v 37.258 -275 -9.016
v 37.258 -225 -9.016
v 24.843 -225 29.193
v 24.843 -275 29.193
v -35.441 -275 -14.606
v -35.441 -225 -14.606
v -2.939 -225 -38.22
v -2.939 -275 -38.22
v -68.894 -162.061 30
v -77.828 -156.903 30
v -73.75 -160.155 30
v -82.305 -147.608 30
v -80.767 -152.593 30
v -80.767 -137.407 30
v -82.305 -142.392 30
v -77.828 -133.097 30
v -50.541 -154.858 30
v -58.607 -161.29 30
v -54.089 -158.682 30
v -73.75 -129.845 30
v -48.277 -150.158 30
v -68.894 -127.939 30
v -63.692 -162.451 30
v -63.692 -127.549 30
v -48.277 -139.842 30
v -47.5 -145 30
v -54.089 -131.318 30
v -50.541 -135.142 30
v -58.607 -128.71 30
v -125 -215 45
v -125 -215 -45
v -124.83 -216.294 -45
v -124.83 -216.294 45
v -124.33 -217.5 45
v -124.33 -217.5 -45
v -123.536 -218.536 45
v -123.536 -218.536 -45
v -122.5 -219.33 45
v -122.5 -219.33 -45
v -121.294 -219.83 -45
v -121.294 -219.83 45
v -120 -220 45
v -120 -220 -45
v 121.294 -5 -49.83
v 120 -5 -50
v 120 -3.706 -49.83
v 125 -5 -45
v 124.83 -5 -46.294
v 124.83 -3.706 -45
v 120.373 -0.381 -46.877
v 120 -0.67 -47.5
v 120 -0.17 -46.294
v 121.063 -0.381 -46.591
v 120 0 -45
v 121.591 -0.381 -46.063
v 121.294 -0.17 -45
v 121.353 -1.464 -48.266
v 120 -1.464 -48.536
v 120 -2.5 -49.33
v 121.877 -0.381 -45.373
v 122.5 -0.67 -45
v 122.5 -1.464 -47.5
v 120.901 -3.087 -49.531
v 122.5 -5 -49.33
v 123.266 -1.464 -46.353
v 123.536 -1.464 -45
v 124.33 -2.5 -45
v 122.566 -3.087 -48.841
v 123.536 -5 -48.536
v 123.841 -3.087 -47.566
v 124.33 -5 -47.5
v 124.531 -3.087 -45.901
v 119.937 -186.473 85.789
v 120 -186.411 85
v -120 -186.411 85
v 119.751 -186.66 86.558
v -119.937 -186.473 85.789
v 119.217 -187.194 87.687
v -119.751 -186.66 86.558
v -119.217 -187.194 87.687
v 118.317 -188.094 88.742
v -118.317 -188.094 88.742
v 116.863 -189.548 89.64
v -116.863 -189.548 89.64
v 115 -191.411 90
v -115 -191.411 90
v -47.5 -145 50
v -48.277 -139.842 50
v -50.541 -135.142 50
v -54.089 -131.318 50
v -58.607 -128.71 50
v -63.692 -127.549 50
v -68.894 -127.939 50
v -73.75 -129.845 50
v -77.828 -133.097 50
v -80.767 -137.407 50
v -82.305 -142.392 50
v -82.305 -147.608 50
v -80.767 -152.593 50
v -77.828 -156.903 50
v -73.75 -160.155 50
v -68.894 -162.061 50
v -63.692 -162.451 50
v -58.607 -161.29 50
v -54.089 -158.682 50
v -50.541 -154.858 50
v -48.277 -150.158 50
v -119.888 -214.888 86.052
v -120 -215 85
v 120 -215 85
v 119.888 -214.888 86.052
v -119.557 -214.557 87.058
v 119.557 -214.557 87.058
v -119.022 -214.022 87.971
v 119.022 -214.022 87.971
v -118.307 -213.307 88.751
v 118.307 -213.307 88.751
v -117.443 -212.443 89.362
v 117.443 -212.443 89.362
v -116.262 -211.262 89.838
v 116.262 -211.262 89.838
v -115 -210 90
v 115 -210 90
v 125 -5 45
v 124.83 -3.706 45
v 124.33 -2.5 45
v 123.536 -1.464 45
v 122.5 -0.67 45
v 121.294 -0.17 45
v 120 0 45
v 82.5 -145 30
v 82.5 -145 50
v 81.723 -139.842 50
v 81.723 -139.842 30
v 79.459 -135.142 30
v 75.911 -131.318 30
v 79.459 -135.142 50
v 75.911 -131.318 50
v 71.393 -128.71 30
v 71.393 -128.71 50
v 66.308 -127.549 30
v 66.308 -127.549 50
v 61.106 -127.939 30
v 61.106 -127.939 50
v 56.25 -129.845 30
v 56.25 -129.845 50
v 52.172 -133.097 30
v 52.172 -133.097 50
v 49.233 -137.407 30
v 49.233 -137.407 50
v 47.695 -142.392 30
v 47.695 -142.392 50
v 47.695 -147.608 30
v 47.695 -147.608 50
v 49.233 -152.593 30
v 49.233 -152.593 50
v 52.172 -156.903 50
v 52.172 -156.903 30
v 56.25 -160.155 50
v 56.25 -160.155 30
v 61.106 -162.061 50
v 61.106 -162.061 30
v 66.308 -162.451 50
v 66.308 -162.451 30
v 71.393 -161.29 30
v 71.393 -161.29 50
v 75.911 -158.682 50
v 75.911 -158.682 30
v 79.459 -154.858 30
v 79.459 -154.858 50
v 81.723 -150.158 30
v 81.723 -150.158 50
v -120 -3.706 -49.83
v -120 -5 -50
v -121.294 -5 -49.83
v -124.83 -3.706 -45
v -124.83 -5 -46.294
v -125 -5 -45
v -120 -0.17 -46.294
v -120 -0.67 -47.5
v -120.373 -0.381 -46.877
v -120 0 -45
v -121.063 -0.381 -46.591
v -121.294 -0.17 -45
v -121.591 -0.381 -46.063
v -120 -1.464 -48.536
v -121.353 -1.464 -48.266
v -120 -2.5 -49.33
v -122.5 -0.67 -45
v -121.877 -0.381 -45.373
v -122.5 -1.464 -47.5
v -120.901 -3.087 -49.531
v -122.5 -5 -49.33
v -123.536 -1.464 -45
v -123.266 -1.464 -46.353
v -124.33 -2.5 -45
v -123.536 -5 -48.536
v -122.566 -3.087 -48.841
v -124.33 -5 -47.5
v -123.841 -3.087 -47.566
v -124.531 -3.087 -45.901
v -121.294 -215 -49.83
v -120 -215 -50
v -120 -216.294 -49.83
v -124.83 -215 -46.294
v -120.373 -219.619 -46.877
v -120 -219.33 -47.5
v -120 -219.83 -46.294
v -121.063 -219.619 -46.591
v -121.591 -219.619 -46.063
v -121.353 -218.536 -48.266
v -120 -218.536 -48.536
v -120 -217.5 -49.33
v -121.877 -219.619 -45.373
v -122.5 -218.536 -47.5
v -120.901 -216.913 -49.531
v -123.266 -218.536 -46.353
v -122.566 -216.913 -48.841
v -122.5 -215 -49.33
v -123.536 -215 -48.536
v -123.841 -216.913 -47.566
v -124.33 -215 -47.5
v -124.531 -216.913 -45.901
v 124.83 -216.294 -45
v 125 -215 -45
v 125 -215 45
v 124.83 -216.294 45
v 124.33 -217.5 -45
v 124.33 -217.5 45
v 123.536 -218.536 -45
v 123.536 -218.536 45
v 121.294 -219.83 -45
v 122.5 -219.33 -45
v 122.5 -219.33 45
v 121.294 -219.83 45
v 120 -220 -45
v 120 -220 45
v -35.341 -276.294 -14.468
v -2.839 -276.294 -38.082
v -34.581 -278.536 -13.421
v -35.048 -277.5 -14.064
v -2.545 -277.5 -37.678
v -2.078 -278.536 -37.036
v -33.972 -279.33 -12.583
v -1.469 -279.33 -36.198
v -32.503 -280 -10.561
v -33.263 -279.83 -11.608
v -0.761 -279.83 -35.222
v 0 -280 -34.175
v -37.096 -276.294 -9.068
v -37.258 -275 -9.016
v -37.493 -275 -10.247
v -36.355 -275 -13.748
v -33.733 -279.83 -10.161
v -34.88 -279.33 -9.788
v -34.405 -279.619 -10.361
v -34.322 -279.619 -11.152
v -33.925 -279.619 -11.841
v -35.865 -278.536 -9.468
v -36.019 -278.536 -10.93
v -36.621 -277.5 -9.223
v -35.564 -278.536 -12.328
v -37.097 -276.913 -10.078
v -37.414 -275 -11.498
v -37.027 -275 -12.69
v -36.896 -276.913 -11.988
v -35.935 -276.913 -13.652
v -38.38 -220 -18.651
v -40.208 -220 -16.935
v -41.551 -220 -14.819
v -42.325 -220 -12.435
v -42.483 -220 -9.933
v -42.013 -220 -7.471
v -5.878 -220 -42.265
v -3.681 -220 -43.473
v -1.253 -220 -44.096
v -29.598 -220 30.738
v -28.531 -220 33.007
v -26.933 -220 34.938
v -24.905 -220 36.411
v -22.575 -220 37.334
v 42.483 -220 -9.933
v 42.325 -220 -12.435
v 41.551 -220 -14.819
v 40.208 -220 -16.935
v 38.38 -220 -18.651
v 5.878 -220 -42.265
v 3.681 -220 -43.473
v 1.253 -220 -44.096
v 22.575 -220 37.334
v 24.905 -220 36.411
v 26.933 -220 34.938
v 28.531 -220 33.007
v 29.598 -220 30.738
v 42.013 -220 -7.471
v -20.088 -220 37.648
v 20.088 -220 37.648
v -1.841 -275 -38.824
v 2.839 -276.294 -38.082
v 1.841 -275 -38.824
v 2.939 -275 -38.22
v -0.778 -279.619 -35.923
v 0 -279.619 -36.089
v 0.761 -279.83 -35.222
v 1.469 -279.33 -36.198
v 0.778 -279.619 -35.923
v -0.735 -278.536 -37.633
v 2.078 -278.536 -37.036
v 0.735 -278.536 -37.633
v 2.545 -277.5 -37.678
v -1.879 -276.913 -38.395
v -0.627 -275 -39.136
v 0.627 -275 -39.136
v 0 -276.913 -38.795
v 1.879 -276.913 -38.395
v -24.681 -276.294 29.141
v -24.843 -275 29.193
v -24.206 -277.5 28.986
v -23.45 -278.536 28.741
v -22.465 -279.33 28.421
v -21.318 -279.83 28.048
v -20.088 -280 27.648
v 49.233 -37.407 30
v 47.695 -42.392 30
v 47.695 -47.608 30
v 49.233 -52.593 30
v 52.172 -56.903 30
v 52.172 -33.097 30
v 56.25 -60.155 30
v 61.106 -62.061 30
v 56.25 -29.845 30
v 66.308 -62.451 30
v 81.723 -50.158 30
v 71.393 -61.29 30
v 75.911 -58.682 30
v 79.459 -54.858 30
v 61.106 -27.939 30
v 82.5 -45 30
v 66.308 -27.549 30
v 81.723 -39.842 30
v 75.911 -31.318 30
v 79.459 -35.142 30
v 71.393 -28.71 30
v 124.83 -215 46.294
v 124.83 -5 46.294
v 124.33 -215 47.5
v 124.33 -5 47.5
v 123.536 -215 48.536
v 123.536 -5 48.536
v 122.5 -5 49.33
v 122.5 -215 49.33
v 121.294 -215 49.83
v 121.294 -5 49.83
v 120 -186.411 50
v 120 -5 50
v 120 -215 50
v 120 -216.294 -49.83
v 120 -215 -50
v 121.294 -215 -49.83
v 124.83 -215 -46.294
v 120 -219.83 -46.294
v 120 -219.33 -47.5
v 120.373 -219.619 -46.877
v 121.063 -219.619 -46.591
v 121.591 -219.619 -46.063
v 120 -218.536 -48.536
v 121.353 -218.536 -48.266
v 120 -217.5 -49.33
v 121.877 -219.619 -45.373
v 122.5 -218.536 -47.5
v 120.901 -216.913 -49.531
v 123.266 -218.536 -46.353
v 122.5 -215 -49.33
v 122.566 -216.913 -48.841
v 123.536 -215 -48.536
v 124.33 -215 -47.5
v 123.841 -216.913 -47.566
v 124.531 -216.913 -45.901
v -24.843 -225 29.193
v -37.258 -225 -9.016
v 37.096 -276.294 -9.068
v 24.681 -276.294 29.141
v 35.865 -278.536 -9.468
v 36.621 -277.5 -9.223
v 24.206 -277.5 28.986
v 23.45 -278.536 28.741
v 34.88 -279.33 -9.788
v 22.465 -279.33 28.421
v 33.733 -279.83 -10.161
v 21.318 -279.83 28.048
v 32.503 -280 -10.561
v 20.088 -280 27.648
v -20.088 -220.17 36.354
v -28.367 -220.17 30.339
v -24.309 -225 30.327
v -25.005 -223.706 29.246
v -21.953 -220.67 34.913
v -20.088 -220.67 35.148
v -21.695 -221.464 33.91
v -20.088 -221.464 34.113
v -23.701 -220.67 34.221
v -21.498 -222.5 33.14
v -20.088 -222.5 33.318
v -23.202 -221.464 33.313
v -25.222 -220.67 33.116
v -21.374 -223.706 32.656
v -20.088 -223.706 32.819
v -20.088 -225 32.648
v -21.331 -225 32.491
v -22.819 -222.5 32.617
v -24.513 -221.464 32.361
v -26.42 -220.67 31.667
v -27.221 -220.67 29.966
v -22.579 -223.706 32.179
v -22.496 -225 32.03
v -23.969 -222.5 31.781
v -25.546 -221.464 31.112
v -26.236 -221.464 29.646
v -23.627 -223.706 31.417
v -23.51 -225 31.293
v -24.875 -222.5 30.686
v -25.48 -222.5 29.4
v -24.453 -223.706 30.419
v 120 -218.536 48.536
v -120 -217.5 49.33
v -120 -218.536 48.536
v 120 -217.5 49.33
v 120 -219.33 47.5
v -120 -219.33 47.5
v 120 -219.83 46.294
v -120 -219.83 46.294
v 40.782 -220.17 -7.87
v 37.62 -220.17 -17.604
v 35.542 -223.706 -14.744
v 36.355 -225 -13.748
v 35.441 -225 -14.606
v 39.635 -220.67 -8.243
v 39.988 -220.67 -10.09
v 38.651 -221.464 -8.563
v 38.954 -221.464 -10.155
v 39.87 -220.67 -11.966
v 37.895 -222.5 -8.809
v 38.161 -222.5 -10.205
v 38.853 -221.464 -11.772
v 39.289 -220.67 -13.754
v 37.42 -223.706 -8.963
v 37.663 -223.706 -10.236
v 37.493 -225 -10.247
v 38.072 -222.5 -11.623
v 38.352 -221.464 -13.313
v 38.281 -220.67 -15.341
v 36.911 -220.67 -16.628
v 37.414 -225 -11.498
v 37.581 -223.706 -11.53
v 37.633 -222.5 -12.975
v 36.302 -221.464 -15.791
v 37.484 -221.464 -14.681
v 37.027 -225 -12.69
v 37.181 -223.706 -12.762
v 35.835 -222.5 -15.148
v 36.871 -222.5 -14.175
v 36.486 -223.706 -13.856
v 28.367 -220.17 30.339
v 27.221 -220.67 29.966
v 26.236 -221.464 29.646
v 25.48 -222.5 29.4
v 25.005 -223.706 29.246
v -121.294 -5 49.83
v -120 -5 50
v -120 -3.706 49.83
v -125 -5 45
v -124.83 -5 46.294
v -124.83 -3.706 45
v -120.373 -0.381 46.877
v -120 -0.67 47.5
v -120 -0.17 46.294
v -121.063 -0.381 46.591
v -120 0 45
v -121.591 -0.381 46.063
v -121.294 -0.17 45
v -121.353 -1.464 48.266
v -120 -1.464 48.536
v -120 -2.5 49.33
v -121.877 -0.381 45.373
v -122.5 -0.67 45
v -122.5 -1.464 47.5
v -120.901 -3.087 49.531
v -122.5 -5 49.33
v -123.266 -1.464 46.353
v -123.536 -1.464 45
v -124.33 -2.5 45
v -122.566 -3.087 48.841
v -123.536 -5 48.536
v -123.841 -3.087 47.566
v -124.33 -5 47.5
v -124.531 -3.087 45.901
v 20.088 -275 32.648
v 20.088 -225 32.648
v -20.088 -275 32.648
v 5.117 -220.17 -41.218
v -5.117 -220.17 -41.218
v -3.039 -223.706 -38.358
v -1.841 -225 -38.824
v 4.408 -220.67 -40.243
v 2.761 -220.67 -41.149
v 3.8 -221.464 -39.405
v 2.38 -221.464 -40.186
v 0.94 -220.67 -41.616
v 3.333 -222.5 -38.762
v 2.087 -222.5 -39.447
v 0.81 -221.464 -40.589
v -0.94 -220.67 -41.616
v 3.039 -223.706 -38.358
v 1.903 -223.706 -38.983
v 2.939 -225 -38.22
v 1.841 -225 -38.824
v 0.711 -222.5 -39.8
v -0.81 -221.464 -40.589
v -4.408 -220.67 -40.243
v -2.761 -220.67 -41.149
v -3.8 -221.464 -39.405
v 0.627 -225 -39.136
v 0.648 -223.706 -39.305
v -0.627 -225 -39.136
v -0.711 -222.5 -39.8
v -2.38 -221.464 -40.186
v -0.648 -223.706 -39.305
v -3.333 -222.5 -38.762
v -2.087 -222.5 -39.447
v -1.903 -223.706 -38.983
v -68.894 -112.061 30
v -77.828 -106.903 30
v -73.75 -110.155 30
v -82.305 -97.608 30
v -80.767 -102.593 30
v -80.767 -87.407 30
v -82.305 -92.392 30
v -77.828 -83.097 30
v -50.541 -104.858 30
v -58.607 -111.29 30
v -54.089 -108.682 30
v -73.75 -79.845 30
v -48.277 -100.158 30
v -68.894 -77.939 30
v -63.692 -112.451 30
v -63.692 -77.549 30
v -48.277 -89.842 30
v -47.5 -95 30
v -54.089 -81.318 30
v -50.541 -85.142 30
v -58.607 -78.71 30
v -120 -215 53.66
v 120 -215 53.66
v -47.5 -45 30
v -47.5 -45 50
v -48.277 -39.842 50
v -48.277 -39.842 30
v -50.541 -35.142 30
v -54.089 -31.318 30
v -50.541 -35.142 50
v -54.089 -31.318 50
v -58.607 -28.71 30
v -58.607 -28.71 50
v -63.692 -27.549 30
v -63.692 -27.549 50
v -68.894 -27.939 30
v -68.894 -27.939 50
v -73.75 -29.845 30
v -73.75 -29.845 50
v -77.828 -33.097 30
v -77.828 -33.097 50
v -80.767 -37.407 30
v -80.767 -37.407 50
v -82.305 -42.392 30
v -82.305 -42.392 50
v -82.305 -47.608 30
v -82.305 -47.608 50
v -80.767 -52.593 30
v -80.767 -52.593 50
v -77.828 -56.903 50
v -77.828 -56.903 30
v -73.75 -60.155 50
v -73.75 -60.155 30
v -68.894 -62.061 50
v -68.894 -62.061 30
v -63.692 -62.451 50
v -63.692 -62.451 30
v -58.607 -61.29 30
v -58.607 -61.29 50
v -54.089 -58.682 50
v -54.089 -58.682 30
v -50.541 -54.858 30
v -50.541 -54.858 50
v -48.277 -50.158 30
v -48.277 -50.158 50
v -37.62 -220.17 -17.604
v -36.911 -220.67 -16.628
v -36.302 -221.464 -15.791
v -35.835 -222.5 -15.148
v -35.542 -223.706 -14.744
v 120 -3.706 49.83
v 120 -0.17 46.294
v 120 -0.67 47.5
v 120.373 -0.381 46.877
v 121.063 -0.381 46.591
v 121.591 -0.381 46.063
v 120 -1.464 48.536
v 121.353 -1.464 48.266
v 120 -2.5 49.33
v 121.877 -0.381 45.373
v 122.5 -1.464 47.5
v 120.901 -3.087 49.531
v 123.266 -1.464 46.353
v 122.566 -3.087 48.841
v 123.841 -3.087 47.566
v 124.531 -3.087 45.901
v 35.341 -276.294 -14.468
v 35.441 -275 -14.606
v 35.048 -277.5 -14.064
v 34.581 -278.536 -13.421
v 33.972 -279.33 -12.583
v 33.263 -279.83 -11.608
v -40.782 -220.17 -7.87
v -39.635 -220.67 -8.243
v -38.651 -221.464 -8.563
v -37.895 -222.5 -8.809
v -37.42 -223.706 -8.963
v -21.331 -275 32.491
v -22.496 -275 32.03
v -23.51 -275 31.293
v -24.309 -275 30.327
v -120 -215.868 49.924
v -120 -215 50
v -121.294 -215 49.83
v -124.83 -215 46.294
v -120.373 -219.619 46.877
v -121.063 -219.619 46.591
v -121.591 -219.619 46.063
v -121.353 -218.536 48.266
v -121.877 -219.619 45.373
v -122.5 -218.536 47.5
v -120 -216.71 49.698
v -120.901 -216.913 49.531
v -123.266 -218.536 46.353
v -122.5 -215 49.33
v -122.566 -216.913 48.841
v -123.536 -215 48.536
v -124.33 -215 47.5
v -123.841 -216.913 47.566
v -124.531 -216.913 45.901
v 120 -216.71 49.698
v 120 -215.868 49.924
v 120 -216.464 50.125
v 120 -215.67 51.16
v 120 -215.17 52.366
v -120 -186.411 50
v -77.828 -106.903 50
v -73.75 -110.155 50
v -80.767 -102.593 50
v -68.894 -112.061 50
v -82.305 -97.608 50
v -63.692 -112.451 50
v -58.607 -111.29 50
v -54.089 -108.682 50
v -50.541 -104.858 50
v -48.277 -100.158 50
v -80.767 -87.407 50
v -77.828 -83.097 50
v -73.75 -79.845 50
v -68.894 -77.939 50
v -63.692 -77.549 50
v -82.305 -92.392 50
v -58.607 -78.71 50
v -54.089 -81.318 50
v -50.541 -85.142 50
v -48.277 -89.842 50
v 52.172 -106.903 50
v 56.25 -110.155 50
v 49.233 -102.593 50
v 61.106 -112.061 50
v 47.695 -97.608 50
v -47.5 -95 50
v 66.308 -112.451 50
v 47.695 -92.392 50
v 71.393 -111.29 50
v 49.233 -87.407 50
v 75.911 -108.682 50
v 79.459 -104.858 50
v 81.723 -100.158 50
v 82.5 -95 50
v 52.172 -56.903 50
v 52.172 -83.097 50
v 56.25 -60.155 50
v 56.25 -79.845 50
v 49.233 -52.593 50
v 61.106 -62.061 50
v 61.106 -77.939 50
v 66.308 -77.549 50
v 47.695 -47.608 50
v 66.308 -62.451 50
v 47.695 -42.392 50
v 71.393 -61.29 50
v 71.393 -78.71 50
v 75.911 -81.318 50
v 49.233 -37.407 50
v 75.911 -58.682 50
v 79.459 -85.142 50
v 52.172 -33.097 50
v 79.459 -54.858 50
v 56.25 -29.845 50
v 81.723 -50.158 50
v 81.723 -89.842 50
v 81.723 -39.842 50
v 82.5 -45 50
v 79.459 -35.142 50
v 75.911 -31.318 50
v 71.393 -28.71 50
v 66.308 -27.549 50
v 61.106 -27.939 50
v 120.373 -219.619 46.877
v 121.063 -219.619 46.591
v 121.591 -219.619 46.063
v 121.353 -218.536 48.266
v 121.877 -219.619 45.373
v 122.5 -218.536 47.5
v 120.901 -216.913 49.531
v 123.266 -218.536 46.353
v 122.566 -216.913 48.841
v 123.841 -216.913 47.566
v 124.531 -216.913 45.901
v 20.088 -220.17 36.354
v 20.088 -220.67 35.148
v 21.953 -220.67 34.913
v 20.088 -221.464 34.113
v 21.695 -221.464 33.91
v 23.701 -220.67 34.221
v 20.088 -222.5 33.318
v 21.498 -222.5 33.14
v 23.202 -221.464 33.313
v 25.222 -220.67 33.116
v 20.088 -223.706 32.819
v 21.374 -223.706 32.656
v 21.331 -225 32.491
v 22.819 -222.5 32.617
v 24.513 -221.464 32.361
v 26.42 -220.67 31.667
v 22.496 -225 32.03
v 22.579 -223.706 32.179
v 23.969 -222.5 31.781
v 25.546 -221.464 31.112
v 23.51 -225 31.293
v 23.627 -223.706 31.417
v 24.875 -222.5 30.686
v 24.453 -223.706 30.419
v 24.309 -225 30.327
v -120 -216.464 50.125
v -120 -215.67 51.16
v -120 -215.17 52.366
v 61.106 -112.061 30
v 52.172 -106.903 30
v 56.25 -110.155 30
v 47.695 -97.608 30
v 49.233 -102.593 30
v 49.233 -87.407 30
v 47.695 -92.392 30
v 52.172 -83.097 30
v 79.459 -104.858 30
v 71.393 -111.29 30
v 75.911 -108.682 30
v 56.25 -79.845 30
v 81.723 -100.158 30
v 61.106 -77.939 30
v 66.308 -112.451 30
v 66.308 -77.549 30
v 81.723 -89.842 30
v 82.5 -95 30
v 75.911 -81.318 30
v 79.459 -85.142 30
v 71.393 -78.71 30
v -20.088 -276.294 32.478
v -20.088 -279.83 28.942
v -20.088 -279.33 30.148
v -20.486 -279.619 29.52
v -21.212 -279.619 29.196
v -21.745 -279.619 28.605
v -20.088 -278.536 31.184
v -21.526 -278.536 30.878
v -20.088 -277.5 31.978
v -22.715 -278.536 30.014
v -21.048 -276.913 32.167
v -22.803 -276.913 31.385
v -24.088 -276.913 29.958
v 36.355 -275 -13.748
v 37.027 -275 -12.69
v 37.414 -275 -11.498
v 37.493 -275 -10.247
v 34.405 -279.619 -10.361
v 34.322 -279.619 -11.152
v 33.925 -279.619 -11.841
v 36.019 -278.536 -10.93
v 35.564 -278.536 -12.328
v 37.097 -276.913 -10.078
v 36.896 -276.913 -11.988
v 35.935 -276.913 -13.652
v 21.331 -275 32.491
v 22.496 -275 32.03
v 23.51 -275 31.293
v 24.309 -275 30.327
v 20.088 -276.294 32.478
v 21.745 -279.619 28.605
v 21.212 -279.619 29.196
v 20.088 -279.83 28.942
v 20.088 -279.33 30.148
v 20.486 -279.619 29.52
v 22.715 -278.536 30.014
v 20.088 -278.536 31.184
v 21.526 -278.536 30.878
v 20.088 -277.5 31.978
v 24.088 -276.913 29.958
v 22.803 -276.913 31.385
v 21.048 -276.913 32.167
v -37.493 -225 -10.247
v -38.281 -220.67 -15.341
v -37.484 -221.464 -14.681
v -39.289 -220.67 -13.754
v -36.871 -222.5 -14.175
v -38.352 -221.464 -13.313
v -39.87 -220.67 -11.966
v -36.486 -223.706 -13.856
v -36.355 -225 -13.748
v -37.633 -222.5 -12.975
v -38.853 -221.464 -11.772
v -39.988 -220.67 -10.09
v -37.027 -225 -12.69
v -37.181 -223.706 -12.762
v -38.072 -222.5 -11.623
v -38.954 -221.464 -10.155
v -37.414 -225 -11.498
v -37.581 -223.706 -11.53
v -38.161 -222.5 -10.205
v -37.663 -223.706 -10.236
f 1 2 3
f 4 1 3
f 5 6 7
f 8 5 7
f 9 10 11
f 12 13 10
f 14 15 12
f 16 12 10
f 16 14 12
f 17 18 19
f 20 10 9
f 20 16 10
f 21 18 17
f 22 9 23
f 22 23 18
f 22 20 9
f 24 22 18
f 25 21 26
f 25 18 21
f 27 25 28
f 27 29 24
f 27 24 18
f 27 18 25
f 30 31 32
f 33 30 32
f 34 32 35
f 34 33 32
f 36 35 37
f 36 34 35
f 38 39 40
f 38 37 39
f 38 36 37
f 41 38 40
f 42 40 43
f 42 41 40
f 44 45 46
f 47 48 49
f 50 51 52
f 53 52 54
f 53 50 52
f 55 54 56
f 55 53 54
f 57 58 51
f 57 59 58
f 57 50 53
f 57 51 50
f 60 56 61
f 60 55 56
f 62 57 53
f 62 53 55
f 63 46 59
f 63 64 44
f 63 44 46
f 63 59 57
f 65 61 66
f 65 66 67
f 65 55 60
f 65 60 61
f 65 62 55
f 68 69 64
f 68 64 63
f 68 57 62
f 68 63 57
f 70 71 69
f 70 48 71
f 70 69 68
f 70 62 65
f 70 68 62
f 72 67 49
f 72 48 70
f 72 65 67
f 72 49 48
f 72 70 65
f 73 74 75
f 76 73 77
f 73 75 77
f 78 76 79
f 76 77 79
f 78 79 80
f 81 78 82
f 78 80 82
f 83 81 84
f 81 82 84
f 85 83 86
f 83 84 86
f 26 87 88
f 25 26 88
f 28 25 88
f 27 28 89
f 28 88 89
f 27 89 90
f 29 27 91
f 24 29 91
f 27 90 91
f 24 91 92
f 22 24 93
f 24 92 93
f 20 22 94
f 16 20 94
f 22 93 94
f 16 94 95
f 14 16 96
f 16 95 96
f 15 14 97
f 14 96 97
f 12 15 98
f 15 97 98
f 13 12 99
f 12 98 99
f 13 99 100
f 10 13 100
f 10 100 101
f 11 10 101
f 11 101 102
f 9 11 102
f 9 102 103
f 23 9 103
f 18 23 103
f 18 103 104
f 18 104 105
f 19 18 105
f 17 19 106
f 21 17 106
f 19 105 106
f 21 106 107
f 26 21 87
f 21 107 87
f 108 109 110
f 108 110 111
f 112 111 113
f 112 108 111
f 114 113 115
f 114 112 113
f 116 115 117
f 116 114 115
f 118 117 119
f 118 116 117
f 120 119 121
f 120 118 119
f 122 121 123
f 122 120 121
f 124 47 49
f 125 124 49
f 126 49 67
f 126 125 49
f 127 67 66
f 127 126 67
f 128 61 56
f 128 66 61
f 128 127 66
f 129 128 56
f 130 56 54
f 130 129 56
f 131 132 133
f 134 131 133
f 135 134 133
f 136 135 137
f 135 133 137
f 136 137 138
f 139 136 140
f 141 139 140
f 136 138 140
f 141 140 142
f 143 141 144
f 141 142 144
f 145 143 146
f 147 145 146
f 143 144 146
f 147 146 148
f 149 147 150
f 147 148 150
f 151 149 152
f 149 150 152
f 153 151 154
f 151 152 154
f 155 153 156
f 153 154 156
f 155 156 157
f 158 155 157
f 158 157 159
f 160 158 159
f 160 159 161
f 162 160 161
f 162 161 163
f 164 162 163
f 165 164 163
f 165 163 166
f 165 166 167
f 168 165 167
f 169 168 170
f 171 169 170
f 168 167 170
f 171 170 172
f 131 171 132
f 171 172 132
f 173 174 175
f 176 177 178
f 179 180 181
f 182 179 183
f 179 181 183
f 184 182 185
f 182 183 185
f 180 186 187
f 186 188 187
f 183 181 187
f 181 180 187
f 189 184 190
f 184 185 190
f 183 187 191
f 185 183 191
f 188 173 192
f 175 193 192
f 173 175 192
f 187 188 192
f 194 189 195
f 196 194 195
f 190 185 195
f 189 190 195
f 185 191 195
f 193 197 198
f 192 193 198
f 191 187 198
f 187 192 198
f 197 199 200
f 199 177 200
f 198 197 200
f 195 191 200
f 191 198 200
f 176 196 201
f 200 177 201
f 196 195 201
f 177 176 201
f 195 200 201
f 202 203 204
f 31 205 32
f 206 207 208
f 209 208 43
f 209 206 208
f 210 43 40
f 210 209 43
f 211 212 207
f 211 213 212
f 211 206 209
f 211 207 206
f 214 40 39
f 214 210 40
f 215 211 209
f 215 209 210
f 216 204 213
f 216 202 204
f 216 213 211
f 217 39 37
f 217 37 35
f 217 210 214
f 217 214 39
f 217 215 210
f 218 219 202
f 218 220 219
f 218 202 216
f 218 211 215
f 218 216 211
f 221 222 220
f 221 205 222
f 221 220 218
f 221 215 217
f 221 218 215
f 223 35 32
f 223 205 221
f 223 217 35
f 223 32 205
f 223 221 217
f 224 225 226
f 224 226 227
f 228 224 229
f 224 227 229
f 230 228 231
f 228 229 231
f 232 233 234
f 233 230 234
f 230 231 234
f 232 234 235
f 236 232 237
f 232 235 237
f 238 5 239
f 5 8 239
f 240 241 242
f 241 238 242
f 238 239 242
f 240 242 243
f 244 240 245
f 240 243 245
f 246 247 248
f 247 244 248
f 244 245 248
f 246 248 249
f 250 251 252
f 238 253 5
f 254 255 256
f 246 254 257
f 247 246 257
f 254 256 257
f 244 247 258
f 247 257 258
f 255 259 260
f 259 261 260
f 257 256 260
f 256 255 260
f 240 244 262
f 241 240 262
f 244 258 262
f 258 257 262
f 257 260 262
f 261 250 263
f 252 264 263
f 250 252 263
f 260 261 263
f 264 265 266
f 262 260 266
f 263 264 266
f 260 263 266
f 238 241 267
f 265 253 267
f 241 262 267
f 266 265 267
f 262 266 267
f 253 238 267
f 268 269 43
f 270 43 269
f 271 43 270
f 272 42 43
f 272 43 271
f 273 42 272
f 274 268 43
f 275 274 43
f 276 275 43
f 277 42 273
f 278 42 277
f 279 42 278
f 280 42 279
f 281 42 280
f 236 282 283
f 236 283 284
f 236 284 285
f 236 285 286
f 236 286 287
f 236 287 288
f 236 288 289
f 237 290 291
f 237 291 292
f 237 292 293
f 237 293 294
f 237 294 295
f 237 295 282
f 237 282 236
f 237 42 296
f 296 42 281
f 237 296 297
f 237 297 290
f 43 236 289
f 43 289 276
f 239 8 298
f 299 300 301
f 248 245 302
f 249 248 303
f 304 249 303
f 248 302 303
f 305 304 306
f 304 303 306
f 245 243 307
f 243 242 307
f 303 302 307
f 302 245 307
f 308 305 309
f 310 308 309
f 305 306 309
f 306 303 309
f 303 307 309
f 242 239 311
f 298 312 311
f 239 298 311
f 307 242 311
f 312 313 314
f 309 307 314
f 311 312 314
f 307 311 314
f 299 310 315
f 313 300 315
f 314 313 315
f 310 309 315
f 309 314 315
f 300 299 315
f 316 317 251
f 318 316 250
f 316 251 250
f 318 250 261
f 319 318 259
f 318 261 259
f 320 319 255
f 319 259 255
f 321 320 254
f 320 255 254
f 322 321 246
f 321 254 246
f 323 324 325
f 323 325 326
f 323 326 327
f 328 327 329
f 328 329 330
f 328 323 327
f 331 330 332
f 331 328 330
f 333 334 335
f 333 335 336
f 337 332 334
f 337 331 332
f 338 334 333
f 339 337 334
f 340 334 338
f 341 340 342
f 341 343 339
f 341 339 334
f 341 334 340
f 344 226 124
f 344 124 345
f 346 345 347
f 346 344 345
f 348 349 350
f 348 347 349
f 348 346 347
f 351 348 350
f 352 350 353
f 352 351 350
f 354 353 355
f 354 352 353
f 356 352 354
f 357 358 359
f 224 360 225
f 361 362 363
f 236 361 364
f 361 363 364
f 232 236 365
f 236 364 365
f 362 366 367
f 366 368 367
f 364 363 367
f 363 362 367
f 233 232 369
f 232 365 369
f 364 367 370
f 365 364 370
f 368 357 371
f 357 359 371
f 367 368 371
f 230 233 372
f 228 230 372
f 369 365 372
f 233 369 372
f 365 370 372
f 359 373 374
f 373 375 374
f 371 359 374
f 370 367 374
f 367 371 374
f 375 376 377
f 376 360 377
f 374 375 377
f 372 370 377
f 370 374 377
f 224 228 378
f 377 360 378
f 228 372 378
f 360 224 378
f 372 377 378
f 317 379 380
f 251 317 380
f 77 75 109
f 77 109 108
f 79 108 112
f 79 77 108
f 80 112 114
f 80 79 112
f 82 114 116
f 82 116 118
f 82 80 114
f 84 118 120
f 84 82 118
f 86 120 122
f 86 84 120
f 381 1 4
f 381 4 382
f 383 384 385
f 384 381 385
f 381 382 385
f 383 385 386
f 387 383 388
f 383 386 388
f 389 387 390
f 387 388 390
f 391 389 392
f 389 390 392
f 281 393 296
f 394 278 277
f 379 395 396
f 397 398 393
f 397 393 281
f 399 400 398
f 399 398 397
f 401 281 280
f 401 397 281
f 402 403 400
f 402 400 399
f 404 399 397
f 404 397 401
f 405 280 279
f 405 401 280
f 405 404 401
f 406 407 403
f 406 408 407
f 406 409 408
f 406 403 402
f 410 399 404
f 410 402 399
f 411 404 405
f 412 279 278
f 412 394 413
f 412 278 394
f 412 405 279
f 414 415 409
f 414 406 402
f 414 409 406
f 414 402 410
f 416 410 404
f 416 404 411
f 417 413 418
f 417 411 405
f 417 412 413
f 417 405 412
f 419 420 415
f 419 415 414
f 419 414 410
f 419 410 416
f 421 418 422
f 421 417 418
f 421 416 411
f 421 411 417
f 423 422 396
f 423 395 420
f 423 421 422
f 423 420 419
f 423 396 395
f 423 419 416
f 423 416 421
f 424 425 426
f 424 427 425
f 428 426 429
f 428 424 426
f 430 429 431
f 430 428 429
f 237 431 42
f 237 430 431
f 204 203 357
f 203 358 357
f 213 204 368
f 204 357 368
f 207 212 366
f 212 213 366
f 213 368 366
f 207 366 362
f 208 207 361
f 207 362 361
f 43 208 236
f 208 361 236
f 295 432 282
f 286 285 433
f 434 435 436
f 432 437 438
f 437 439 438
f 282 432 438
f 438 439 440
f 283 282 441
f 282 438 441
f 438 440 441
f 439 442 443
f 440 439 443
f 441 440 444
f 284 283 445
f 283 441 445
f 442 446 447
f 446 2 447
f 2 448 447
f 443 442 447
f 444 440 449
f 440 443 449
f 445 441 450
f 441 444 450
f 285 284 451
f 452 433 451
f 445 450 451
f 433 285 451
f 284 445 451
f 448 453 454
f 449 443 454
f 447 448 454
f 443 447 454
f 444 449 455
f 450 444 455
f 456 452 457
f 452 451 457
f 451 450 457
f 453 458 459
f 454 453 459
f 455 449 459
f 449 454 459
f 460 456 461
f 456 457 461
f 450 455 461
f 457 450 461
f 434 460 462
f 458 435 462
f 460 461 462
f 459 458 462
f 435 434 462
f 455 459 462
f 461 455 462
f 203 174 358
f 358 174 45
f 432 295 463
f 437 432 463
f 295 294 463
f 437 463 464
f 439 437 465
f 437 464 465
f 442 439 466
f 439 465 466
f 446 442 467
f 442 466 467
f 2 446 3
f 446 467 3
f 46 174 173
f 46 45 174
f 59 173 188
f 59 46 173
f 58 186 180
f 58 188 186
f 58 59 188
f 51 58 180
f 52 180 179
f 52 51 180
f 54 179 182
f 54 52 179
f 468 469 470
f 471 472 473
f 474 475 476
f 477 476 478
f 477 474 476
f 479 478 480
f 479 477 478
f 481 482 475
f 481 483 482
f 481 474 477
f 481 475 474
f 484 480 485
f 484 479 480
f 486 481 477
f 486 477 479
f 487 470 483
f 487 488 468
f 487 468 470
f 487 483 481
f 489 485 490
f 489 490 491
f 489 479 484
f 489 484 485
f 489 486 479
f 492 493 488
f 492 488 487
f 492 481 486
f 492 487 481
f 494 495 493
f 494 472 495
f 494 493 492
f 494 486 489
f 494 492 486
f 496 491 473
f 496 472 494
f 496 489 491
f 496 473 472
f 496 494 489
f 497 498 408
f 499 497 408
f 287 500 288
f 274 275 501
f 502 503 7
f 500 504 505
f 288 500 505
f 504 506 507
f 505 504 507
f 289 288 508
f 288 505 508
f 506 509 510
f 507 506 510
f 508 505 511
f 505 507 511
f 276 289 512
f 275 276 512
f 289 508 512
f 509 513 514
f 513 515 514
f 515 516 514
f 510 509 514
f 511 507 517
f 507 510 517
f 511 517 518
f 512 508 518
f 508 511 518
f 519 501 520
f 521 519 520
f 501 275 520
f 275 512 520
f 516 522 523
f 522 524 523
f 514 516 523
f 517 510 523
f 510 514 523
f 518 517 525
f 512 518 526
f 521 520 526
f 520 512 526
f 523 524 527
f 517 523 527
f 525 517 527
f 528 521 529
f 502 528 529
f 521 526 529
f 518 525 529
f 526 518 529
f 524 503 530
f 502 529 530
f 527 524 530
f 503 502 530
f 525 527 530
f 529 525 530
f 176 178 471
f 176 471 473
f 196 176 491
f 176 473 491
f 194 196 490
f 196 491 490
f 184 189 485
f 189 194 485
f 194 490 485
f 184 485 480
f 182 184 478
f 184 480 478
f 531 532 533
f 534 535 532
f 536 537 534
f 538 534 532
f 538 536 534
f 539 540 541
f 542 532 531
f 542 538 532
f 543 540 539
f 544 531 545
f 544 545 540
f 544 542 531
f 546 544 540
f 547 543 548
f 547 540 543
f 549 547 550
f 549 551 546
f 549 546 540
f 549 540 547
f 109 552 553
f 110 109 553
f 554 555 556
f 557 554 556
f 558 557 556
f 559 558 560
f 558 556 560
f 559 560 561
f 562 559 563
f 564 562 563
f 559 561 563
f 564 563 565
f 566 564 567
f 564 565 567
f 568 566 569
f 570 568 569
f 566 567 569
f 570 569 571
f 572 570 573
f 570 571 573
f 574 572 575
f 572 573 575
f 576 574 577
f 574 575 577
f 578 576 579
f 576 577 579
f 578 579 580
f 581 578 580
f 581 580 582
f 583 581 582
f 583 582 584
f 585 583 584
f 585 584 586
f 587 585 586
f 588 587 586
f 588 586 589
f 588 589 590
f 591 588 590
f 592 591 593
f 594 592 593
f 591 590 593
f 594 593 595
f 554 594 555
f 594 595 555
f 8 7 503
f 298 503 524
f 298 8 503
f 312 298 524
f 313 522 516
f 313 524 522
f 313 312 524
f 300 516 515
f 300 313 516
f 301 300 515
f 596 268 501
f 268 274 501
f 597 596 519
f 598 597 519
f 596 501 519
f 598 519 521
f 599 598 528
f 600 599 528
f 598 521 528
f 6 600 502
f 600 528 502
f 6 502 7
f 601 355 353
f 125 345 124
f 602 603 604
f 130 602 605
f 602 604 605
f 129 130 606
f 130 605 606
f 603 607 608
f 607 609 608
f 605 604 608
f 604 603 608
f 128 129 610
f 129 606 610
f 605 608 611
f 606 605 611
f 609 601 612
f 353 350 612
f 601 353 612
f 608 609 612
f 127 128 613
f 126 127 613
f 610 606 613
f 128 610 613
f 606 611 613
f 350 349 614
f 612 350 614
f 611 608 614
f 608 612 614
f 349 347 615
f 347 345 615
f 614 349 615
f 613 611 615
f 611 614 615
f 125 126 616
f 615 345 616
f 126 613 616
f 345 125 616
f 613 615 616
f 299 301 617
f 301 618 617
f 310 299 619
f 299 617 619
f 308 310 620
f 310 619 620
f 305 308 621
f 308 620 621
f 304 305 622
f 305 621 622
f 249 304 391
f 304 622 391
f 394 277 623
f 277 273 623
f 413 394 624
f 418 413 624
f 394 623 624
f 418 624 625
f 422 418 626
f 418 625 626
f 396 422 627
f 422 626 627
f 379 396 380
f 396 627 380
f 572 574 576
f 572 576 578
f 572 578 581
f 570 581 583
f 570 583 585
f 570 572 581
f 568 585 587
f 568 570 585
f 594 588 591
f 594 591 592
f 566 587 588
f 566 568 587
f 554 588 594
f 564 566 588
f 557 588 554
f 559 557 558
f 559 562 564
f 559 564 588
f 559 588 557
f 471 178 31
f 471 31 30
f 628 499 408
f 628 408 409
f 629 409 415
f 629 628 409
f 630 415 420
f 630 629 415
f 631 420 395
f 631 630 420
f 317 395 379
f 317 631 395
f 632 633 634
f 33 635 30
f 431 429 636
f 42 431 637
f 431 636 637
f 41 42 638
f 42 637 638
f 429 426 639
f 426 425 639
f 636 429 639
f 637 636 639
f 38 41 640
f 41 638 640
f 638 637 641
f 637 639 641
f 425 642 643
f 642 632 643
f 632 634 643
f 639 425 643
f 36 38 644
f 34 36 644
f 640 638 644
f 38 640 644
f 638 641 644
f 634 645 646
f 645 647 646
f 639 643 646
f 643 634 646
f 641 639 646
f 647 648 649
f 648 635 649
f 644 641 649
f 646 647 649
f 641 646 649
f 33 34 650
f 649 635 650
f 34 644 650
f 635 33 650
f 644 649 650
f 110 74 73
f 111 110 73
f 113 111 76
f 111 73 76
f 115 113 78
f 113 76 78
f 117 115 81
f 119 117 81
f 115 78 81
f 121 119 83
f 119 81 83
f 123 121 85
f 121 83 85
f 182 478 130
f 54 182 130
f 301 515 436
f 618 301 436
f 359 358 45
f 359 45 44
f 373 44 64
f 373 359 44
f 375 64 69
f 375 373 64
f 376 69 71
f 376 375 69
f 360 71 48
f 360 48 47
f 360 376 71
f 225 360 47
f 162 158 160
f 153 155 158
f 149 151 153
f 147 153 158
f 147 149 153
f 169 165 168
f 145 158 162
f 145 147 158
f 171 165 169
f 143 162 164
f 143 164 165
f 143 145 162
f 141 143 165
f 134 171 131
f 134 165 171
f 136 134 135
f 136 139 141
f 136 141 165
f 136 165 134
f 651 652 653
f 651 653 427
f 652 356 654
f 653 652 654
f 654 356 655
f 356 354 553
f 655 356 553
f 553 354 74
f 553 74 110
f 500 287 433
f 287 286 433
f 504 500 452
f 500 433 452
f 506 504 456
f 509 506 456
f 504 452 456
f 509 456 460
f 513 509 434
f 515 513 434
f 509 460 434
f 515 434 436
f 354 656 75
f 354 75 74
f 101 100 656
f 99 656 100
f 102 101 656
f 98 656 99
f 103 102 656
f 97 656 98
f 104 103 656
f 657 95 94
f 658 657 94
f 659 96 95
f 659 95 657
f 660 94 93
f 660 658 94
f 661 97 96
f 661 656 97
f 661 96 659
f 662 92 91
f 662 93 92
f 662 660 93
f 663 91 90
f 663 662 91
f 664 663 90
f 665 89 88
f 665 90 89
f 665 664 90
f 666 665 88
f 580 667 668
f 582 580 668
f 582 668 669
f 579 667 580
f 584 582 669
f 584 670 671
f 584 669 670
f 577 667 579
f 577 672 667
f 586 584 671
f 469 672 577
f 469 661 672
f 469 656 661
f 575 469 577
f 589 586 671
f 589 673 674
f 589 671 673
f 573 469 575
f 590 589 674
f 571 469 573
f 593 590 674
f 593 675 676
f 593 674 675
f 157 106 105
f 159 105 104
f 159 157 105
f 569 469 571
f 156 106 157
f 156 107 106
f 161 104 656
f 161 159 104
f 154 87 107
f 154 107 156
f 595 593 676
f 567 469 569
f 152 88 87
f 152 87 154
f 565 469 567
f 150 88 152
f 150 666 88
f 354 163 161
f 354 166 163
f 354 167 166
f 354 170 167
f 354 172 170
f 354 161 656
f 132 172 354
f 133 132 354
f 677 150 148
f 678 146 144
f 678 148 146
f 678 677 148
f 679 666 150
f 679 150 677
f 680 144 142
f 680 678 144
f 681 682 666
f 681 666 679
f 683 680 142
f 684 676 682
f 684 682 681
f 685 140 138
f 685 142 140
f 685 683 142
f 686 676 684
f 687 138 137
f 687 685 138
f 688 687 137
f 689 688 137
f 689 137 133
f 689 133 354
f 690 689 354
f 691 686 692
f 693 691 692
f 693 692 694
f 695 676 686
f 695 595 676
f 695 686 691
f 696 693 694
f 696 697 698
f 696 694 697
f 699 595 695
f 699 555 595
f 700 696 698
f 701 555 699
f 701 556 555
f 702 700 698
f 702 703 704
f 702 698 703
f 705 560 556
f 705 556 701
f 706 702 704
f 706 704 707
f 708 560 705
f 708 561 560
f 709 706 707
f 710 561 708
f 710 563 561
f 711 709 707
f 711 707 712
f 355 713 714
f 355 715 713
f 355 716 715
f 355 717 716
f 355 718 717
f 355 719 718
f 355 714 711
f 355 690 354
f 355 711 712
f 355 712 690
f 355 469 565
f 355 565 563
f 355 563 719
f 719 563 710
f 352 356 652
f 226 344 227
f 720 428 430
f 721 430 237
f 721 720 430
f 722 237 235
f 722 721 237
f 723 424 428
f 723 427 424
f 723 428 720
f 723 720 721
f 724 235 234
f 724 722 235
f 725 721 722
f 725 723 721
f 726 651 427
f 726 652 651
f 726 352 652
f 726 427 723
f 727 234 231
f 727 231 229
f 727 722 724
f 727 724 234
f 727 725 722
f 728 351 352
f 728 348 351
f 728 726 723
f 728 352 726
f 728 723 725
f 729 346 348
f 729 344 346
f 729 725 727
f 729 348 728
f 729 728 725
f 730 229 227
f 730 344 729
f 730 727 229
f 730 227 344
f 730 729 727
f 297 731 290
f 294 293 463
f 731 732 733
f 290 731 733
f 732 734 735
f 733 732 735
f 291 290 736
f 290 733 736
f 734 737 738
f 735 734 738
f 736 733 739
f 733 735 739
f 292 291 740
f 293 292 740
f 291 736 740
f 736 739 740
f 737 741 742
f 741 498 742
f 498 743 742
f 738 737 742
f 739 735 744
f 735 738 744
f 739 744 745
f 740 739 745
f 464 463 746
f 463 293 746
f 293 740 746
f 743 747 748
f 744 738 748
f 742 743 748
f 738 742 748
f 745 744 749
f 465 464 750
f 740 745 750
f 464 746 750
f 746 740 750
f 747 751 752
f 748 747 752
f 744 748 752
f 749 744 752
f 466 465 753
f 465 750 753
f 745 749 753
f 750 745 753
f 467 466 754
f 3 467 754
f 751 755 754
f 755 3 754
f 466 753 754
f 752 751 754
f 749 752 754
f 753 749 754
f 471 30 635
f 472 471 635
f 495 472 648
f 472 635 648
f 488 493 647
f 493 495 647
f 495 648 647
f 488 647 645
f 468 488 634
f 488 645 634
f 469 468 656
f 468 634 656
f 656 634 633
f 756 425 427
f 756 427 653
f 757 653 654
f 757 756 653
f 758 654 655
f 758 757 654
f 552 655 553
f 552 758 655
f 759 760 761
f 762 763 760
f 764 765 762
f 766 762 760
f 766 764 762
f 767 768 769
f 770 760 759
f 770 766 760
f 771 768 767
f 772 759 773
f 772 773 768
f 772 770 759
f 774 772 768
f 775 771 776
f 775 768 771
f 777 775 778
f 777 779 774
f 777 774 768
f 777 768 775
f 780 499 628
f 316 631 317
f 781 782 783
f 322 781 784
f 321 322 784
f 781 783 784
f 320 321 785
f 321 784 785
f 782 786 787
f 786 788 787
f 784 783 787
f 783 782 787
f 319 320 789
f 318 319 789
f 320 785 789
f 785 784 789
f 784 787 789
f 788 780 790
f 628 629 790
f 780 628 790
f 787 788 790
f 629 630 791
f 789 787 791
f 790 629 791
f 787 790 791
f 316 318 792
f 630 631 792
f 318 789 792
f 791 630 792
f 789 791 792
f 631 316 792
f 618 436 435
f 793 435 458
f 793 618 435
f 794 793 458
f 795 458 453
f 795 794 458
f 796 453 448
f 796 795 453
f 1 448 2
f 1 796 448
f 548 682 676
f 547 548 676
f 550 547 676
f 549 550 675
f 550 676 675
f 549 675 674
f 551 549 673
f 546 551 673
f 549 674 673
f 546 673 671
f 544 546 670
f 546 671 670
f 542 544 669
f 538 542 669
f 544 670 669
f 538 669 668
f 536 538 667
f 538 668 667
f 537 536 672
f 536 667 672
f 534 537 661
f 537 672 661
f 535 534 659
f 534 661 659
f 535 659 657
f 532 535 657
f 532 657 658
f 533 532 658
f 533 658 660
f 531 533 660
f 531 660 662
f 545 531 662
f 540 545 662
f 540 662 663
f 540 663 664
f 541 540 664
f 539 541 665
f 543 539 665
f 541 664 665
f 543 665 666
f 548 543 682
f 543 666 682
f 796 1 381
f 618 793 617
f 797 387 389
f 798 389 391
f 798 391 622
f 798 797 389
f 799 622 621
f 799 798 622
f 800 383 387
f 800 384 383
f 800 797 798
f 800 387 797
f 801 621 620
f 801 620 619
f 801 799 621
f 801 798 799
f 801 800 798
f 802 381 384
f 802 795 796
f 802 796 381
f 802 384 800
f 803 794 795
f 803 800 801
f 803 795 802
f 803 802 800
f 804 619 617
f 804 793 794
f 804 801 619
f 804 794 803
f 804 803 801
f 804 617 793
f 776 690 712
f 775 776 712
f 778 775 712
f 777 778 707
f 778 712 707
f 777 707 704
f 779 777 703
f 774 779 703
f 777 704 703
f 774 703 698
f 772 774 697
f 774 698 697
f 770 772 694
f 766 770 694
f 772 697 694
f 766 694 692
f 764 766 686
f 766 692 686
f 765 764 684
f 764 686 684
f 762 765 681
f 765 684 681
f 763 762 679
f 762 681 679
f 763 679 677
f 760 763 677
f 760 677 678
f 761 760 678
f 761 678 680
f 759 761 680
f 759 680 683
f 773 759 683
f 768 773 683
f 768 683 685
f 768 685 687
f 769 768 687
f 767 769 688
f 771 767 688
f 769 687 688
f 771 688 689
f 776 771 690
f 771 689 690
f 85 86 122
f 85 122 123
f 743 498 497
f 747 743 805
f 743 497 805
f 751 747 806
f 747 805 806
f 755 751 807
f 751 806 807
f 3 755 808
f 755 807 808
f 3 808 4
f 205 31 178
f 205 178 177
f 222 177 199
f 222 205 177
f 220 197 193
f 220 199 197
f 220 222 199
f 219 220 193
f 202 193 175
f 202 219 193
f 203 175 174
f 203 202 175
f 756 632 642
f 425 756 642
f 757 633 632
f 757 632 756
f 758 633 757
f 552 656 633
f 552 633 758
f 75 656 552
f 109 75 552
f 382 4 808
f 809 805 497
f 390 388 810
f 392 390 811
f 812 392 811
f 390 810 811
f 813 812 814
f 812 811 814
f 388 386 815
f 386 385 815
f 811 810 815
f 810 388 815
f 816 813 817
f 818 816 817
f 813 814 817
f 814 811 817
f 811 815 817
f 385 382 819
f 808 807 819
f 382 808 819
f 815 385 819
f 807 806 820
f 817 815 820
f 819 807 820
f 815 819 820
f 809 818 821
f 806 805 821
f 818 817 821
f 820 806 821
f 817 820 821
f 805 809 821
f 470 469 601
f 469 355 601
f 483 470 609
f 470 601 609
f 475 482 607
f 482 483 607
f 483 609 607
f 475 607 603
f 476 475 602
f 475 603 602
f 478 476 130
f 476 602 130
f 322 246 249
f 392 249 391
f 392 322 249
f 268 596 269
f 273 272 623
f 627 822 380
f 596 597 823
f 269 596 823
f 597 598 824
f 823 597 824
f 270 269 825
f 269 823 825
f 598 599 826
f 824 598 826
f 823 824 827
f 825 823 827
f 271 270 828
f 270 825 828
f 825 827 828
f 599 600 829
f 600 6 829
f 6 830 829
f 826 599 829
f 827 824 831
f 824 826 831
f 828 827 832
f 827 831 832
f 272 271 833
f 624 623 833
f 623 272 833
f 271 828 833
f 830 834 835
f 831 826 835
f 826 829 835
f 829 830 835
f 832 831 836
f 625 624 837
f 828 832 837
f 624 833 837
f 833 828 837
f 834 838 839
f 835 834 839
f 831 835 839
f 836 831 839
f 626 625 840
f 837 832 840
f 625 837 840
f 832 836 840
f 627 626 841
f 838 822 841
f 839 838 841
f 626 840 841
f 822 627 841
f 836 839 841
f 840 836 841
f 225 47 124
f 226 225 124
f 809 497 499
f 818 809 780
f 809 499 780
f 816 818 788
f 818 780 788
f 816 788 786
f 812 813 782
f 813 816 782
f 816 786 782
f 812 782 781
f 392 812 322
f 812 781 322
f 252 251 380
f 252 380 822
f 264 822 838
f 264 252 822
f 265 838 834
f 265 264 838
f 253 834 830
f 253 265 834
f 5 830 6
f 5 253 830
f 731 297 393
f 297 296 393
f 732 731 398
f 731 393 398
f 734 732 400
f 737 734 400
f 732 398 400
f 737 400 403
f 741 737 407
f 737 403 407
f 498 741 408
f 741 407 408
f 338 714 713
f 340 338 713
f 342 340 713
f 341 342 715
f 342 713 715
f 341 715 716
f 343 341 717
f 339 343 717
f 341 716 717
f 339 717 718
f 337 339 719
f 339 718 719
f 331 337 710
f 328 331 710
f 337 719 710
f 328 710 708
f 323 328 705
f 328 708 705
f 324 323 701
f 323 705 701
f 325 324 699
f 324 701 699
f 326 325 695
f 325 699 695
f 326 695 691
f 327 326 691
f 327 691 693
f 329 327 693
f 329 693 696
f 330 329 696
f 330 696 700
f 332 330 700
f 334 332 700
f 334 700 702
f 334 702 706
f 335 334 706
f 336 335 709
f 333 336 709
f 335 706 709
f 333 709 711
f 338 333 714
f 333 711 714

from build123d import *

# Parameters (mm, degrees)
F0_W        = 250
F0_H        = 100
F1_DEPTH    = 220
F2_R        = 5
F4_DEPTH    = 60
F5_W        = 240
F5_H        = 28.5892599821
F6_DEPTH    = 40
F7_T1_DEPTH = 240
F7_T3_DEPTH = 265
F7_T5_DEPTH = 53.5892599821
F8_R        = 5
F9_R        = 17.5
F10_DEPTH   = 20


# Not quite as in the source:
# - a fillet or chamfer that OpenCascade refuses, or shapes differently, is made with other operations: its cross-section is extruded or revolved along the edge and cut away or added


with BuildPart() as f1:
    # F0 (on Front) → F1 (new body)
    with BuildSketch(Plane.XZ):
        Rectangle(F0_W, F0_H)
    extrude(amount=F1_DEPTH)

    # F2
    f2_edges = [f1.edges().sort_by_distance(p)[0] for p in [
        (125, -110, 50),
        (-125, -110, 50),
        (0, 0, 50),
        (0, -220, 50),
        (-125, -110, -50),
        (125, -110, -50),
        (0, 0, -50),
        (0, -220, -50),
        (125, -220, 0),
        (-125, -220, 0),
        (-125, 0, 0),
        (125, 0, 0),
    ]]
    fillet(f2_edges, radius=F2_R)

    # F3 (on face) → F4 (join)
    with BuildSketch(Plane.XZ.offset(220)):
        Polygon((23.7203992628, 32.6483286917), (-23.7203992628, 32.6483286917), (-38.380412234, -12.4705518844), (0, -40.3555536147), (38.380412234, -12.4705518844), align=None)
    extrude(amount=F4_DEPTH)

    # F5 (on face) → F6 (join)
    with BuildSketch(Plane.XY.offset(50)):
        with Locations((0, -200.7053700089)):
            Rectangle(F5_W, F5_H)
    extrude(amount=F6_DEPTH)

    # F7: fillet of radius 5 on 6 edges, made by hand

    # F7_s2 → F7_t1 (join)
    with BuildSketch(Plane.YZ.offset(-120)):
        with BuildLine():
            ThreePointArc((-217.5, 49.3301270189), (-215.6698729811, 51.1602540378), (-215, 53.6602540378))
            Line((-215, 53.6602540378), (-215, 50))
            ThreePointArc((-215, 50), (-216.2940952255, 49.8296291314), (-217.5, 49.3301270189))
        make_face()
    extrude(amount=F7_T1_DEPTH)

    # F7_s4 → F7_t3 (cut)
    with BuildSketch(Plane.YZ.offset(-132.5)):
        with BuildLine():
            ThreePointArc((-186.4107400179, 85), (-187.875206112, 88.5355339059), (-191.4107400179, 90))
            Line((-191.4107400179, 90), (-186.4107400179, 90))
            Line((-186.4107400179, 90), (-186.4107400179, 85))
        make_face()
        with BuildLine():
            ThreePointArc((-215, 85), (-213.5355339059, 88.5355339059), (-210, 90))
            Line((-210, 90), (-215, 90))
            Line((-215, 90), (-215, 85))
        make_face()
    extrude(amount=F7_T3_DEPTH, mode=Mode.SUBTRACT)

    # F7_s6 → F7_t5 (cut)
    with BuildSketch(Plane.XZ.offset(173.9107400179)):
        with BuildLine():
            ThreePointArc((-120, 85), (-118.5355339059, 88.5355339059), (-115, 90))
            Line((-115, 90), (-120, 90))
            Line((-120, 90), (-120, 85))
        make_face()
        with BuildLine():
            ThreePointArc((120, 85), (118.5355339059, 88.5355339059), (115, 90))
            Line((115, 90), (120, 90))
            Line((120, 90), (120, 85))
        make_face()
    extrude(amount=F7_T5_DEPTH, mode=Mode.SUBTRACT)

    # F8
    f8_edges = [f1.edges().sort_by_distance(p)[0] for p in [
        (0, -220, 32.648329),
        (31.050406, -220, 10.088888),
        (19.190206, -220, -26.413053),
        (-19.190206, -220, -26.413053),
        (-31.050406, -220, 10.088888),
        (31.050406, -280, 10.088888),
        (0, -280, 32.648329),
        (-31.050406, -280, 10.088888),
        (-19.190206, -280, -26.413053),
        (19.190206, -280, -26.413053),
        (-23.720399, -250, 32.648329),
        (23.720399, -250, 32.648329),
        (38.380412, -250, -12.470552),
        (0, -250, -40.355554),
        (-38.380412, -250, -12.470552),
    ]]
    fillet(f8_edges, radius=F8_R)

    # F9 (on face) → F10 (cut)
    with BuildSketch(Plane.XY.offset(50)):
        with Locations((-65, -45)):
            Circle(F9_R)
        with Locations((-65, -95)):
            Circle(F9_R)
        with Locations((-65, -145)):
            Circle(F9_R)
        with Locations((65, -145)):
            Circle(F9_R)
        with Locations((65, -95)):
            Circle(F9_R)
        with Locations((65, -45)):
            Circle(F9_R)
    extrude(amount=-F10_DEPTH, mode=Mode.SUBTRACT)


solid = f1.part
